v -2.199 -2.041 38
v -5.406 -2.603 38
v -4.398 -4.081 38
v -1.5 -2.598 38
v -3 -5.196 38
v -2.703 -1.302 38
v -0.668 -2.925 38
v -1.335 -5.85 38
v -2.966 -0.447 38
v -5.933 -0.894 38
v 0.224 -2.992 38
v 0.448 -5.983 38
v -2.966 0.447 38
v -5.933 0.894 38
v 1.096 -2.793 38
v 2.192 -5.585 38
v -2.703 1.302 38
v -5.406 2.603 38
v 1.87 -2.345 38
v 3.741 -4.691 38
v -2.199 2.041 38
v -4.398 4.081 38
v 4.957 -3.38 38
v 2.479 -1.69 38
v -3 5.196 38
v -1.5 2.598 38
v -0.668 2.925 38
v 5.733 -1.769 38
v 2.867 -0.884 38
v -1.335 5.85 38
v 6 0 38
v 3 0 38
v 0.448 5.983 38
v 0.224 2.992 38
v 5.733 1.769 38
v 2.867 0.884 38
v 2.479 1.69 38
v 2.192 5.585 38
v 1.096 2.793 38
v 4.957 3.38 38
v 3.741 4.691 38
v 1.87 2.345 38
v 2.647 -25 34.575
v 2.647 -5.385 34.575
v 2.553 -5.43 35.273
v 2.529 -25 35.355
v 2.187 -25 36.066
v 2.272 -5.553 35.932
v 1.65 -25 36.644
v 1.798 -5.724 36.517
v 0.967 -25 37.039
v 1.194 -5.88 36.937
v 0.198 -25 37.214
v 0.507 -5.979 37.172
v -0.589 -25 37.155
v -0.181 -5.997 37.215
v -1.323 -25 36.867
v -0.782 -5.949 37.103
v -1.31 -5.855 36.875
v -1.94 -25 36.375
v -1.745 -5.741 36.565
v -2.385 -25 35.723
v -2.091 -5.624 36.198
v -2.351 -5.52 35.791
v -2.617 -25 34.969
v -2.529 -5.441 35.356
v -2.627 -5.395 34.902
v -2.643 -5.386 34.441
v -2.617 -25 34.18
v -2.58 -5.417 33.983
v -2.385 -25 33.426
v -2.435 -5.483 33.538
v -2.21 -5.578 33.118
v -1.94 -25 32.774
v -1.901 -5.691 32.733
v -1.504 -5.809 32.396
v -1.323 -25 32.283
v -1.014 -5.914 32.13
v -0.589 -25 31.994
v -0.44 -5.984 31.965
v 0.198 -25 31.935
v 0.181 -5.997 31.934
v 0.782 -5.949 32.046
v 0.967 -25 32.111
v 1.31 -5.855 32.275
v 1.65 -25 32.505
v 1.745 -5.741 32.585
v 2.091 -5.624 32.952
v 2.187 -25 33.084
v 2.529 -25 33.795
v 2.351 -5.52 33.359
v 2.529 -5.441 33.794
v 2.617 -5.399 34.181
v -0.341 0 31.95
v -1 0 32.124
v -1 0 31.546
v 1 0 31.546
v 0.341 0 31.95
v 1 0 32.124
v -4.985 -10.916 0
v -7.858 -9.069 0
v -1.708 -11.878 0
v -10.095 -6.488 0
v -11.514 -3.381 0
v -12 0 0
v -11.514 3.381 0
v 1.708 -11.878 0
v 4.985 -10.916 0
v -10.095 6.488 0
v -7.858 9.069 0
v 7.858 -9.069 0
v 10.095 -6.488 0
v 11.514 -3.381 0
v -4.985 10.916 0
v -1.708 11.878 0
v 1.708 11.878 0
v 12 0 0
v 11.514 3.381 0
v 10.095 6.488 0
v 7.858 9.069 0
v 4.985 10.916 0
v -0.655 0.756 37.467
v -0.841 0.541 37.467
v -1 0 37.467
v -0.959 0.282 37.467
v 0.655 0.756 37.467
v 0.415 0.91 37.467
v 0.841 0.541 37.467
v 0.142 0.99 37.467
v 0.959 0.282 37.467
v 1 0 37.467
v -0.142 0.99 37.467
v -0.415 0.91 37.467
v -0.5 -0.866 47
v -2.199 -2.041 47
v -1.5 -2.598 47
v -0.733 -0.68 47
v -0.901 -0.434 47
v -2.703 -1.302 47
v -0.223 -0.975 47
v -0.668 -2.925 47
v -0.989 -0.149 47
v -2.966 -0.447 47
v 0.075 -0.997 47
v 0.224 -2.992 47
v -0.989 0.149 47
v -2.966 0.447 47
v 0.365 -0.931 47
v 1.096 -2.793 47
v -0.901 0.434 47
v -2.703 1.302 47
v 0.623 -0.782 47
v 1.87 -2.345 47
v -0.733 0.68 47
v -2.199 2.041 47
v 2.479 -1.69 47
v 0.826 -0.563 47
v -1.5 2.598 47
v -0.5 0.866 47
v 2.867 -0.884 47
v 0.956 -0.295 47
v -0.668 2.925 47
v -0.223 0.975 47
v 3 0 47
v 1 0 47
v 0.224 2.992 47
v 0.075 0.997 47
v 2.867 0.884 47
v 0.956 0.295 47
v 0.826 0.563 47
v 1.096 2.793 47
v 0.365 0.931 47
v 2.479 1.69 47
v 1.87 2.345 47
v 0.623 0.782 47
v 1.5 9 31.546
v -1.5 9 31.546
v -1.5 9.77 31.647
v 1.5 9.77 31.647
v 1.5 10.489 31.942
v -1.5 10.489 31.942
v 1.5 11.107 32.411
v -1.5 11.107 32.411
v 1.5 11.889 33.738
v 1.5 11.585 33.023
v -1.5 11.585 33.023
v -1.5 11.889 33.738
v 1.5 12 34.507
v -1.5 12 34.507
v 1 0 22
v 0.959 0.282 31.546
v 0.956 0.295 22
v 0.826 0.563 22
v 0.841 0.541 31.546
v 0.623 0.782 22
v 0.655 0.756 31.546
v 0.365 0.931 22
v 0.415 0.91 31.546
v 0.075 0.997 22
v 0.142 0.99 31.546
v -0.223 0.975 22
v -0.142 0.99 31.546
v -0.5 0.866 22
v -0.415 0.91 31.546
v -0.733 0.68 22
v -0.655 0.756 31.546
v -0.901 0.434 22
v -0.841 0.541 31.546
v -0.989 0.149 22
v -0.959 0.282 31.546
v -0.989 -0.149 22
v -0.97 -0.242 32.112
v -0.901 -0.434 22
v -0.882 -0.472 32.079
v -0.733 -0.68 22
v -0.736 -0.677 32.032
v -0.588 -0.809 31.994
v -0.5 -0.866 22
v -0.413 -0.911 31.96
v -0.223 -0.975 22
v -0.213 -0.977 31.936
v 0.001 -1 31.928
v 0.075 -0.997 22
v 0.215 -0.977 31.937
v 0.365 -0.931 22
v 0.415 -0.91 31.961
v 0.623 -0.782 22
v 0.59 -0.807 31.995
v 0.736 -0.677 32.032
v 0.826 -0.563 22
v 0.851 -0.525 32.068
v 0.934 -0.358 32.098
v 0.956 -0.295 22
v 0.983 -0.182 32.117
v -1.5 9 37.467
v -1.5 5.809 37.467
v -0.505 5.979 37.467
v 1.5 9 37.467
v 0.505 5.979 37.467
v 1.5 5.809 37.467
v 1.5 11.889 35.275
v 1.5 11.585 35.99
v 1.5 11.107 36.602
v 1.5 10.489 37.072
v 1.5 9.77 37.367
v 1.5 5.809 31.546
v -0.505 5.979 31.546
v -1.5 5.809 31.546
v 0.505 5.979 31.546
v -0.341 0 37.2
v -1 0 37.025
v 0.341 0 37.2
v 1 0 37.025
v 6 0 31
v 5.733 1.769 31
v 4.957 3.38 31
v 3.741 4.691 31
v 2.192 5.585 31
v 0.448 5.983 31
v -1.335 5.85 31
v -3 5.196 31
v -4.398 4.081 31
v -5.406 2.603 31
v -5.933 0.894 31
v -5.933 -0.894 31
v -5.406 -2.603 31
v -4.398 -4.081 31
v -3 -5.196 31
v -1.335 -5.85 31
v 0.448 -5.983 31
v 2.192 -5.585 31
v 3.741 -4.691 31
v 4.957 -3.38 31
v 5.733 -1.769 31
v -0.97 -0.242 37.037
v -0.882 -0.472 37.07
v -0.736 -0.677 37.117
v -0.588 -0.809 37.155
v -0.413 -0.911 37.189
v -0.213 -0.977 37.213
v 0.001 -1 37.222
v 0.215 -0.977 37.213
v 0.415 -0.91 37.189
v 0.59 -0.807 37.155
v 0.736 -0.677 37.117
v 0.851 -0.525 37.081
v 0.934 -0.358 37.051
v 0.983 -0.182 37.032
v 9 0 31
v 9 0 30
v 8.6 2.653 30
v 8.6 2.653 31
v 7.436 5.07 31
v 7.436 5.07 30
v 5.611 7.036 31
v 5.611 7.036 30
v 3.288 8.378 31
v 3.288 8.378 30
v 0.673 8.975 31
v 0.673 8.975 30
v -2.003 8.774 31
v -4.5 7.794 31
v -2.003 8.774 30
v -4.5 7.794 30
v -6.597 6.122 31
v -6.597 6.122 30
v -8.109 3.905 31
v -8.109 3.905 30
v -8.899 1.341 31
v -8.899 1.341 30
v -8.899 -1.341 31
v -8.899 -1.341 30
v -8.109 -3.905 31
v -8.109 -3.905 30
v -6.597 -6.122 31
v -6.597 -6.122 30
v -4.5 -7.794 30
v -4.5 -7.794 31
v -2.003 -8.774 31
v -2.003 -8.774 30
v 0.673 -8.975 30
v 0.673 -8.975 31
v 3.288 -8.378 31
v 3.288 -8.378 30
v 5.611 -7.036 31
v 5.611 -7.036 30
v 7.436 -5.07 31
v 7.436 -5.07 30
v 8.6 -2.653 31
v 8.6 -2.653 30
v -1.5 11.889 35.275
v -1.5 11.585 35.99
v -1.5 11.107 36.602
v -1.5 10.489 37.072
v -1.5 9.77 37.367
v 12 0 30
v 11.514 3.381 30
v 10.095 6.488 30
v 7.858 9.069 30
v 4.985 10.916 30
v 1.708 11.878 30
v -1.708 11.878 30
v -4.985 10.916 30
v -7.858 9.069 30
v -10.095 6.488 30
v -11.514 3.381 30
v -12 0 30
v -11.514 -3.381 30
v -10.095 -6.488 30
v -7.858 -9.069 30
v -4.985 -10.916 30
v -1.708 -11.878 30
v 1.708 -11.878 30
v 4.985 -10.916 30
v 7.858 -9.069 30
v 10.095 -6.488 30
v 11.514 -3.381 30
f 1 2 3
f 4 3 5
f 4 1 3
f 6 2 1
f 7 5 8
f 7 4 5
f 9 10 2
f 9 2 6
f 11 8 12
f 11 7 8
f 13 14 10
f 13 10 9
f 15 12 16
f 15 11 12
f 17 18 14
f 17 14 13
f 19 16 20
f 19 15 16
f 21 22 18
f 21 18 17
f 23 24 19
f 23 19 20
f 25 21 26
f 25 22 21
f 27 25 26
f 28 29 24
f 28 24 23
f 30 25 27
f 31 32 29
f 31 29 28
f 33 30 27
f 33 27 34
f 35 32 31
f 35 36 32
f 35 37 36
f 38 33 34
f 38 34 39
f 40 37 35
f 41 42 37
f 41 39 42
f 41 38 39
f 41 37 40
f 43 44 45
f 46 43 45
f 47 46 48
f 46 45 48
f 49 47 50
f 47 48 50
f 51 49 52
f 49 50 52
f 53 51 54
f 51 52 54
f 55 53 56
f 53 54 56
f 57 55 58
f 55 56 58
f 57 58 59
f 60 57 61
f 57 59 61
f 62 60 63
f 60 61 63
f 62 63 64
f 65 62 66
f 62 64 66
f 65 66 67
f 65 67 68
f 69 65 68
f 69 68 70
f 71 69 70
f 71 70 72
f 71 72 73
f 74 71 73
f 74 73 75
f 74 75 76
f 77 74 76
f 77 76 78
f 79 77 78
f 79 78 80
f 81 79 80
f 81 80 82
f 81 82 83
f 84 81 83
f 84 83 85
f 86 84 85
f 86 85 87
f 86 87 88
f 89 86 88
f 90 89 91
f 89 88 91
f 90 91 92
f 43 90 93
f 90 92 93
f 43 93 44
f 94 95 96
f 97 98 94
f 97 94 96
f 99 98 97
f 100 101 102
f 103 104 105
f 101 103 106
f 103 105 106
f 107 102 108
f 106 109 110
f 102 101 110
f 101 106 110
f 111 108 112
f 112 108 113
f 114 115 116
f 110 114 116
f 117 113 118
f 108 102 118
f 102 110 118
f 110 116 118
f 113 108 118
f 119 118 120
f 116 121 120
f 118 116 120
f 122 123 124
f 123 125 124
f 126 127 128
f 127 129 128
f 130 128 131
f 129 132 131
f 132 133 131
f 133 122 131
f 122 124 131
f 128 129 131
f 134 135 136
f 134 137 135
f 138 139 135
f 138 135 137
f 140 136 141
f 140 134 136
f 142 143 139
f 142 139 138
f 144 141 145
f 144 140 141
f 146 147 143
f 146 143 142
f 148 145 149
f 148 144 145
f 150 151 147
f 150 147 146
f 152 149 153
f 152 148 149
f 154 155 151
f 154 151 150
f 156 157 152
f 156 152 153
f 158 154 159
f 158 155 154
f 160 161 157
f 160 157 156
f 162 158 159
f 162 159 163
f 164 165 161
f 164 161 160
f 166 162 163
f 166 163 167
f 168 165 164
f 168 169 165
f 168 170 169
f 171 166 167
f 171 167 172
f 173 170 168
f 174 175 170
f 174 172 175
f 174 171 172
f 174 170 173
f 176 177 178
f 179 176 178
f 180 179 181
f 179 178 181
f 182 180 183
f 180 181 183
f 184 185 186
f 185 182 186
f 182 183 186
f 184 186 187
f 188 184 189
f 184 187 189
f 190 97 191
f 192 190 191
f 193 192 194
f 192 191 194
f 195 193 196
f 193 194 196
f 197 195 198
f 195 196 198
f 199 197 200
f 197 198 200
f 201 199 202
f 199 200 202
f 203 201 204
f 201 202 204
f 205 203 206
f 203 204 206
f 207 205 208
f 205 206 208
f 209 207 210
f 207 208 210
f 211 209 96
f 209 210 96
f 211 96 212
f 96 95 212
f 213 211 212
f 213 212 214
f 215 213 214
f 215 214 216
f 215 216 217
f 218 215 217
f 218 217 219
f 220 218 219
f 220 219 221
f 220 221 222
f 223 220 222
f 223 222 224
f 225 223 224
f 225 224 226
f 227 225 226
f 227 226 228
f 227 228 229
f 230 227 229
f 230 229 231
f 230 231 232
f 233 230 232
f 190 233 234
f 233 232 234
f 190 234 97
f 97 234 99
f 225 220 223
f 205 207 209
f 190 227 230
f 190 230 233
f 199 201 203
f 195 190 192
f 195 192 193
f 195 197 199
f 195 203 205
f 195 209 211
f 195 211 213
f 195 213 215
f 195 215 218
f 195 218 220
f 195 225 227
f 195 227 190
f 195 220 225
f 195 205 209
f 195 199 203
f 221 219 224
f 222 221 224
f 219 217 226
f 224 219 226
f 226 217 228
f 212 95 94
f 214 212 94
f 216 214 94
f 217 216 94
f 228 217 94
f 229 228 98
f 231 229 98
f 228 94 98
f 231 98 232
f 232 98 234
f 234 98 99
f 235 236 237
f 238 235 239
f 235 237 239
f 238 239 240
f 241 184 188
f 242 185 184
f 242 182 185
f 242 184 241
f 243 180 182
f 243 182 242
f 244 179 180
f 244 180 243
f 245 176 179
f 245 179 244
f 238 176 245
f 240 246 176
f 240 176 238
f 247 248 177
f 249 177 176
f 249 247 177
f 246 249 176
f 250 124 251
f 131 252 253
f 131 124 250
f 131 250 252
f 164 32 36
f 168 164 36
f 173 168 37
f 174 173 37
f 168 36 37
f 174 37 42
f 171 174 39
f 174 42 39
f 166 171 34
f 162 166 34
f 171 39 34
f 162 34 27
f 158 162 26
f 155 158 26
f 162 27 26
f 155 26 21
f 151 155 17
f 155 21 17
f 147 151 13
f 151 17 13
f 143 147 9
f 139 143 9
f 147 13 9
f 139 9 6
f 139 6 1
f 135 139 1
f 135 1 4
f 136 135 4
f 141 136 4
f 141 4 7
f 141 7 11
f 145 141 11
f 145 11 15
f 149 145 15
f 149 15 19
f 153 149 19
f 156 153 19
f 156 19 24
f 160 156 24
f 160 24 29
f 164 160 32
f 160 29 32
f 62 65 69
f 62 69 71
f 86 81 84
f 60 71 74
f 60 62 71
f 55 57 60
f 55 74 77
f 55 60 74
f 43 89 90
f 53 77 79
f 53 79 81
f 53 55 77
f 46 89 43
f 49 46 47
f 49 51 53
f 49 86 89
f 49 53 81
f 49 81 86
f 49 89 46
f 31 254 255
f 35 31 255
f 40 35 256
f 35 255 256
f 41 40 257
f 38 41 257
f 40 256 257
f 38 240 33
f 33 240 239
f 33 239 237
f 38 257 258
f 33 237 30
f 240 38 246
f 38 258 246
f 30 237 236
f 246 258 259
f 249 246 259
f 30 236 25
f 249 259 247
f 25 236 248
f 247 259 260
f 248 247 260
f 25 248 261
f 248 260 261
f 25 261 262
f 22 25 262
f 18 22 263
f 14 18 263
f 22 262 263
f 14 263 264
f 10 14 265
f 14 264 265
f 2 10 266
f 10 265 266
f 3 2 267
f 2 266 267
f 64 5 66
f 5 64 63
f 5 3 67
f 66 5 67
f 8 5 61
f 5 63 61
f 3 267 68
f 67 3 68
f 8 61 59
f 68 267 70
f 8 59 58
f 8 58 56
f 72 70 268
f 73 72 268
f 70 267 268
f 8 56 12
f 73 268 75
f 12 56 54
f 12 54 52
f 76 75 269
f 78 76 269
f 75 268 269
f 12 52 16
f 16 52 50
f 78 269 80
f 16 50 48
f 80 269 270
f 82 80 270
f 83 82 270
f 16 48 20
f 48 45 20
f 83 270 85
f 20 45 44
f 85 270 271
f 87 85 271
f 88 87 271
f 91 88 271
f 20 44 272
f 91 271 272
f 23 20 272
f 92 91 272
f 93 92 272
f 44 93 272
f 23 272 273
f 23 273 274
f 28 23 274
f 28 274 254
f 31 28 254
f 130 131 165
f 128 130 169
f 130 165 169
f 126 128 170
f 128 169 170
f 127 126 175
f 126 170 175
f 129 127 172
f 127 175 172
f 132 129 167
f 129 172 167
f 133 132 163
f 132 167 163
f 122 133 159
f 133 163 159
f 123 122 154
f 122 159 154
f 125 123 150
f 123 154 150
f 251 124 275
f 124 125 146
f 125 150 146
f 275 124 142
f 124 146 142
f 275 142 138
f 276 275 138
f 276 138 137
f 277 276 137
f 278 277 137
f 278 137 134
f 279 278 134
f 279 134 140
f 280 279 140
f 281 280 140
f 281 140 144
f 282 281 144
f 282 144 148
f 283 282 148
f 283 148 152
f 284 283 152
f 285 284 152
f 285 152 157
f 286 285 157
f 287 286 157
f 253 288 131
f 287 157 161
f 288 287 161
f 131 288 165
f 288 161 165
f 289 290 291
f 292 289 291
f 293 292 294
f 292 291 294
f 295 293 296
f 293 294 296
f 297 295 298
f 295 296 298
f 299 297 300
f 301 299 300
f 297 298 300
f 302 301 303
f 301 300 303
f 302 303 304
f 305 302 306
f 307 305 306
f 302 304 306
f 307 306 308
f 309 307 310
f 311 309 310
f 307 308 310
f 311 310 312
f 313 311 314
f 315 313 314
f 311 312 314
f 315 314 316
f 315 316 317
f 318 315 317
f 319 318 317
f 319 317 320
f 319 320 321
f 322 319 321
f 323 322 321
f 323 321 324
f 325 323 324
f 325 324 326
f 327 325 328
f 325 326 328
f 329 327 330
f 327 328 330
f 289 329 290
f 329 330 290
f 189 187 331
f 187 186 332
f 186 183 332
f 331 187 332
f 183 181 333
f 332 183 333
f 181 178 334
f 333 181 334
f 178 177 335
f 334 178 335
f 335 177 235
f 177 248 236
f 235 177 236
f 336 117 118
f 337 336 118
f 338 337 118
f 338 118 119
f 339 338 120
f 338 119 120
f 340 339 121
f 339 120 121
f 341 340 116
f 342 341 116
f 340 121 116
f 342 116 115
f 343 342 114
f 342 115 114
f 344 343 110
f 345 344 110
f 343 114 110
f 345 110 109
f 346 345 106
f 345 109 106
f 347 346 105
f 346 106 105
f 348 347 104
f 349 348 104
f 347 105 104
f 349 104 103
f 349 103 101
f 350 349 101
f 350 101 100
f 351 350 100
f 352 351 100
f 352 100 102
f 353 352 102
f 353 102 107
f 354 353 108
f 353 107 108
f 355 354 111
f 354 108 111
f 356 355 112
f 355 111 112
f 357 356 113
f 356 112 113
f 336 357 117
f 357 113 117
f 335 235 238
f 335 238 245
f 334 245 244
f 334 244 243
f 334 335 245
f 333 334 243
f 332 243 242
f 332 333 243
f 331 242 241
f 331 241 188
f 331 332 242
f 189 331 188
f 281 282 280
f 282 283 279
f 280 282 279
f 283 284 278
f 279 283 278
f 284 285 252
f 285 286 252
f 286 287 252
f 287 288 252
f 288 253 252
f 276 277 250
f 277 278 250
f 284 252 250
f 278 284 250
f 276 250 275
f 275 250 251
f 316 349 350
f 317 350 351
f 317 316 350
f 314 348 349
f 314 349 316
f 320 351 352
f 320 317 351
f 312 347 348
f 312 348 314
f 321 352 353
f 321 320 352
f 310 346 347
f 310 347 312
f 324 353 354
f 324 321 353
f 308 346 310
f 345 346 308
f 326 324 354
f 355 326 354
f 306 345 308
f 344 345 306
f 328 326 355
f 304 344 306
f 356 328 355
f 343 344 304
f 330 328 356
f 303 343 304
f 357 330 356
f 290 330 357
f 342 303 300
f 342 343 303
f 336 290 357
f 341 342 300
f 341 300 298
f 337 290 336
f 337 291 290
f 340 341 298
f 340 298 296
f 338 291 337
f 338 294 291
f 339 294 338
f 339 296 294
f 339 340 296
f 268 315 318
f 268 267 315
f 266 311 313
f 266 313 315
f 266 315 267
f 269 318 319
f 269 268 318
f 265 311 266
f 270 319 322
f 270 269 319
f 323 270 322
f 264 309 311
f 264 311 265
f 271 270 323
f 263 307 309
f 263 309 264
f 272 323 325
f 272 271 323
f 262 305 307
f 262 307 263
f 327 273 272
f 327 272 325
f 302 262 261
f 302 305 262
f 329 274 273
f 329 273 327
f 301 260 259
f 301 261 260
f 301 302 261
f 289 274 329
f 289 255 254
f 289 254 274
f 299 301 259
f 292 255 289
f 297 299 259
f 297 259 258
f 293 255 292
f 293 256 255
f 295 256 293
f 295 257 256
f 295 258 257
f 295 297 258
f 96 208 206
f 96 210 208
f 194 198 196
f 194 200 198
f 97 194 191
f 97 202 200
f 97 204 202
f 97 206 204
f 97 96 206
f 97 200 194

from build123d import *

# Parameters (mm, degrees)
F0_R         = 12
F1_DEPTH     = 30
F2_R         = 9
F3_DEPTH     = 1
F4_R         = 6
F5_DEPTH     = 7
F6_R         = 3
F7_DEPTH     = 9
F8_R         = 1
F9_DEPTH     = 25
F10_R        = 2.6468455099
F11_DEPTH    = 25
F12_W        = 3
F12_H        = 5.9210534014
F13_DEPTH    = 12
F14_T1_DEPTH = 18


# Not quite as in the source:
# - a fillet or chamfer that OpenCascade refuses, or shapes differently, is made with other operations: its cross-section is extruded or revolved along the edge and cut away or added


with BuildPart() as f1:
    # F0 (on Top) → F1 (new body)
    with BuildSketch(Plane.XY):
        Circle(F0_R)
    extrude(amount=F1_DEPTH)

    # F2 (on face) → F3 (join)
    with BuildSketch(Plane.XY.offset(30)):
        Circle(F2_R)
    extrude(amount=F3_DEPTH)

    # F4 (on face) → F5 (join)
    with BuildSketch(Plane.XY.offset(31)):
        Circle(F4_R)
    extrude(amount=F5_DEPTH)

    # F6 (on face) → F7 (join)
    with BuildSketch(Plane.XY.offset(38)):
        Circle(F6_R)
    extrude(amount=F7_DEPTH)

    # F8 (on face) → F9 (cut)
    with BuildSketch(Plane.XY.offset(47)):
        Circle(F8_R)
    extrude(amount=-F9_DEPTH, mode=Mode.SUBTRACT)

    # F10 (on Front) → F11 (join)
    with BuildSketch(Plane.XZ):
        with Locations((0, 34.5747359097)):
            Circle(F10_R)
    extrude(amount=F11_DEPTH)

    # F12 (on Front) → F13 (join)
    with BuildSketch(Plane.XZ):
        with Locations((0, 34.5066897571)):
            Rectangle(F12_W, F12_H)
    extrude(amount=-F13_DEPTH)

    # F14: fillet of radius 3 on 2 edges, made by hand

    # F14_s2 → F14_t1 (cut)
    with BuildSketch(Plane.YZ.offset(-9)):
        with BuildLine():
            ThreePointArc((9, 37.4672164578), (11.1213203436, 36.5885368014), (12, 34.4672164578))
            Line((12, 34.4672164578), (12, 37.4672164578))
            Line((12, 37.4672164578), (9, 37.4672164578))
        make_face()
        with BuildLine():
            ThreePointArc((9, 31.5461630564), (11.1213203436, 32.4248427128), (12, 34.5461630564))
            Line((12, 34.5461630564), (12, 31.5461630564))
            Line((12, 31.5461630564), (9, 31.5461630564))
        make_face()
    extrude(amount=F14_T1_DEPTH, mode=Mode.SUBTRACT)


solid = f1.part
